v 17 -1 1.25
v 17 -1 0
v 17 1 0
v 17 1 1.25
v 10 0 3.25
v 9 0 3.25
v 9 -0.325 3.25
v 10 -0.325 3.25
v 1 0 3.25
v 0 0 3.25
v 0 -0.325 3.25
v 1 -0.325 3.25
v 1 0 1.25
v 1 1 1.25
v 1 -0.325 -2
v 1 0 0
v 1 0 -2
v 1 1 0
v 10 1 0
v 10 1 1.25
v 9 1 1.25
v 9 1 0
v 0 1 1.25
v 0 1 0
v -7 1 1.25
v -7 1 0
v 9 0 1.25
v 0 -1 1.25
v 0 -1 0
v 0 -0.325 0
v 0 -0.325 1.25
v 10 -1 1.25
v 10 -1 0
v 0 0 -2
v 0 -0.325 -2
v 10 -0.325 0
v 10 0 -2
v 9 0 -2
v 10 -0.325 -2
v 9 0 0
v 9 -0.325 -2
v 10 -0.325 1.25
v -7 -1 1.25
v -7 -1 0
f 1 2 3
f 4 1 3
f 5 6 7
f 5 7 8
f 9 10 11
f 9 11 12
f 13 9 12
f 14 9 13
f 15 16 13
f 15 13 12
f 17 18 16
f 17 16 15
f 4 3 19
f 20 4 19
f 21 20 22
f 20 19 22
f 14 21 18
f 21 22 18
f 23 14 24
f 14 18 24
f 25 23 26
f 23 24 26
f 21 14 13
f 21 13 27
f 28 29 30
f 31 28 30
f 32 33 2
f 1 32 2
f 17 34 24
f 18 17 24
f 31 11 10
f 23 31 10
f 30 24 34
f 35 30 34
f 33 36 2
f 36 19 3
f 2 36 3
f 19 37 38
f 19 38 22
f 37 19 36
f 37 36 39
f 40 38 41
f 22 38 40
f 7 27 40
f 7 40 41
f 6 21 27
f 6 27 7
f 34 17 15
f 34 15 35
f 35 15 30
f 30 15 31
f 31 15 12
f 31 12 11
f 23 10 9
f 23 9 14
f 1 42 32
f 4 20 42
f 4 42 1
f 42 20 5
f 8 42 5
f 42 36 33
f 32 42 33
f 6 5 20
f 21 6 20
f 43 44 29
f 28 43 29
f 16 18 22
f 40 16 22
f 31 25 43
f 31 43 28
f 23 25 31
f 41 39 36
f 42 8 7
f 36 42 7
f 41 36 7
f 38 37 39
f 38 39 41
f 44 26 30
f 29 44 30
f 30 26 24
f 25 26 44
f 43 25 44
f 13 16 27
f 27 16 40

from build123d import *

# Parameters (mm, degrees)
BOSS_EXTRUDE1_DEPTH = 1.25
SKETCH2_W           = 1
SKETCH2_H           = 0.325
BOSS_EXTRUDE2_DEPTH = 2
SKETCH3_W           = 1
SKETCH3_H           = 0.325
BOSS_EXTRUDE3_DEPTH = 2
BOSS_EXTRUDE7_DEPTH = 1
BOSS_EXTRUDE8_DEPTH = 1


with BuildPart() as part:
    # Sketch1 → Boss-Extrude1 (new body)
    with BuildSketch(Plane.XY):
        Polygon((1, 0), (9, 0), (9, -0.325), (10, -0.325), (10, -1), (17, -1), (17, 1), (10, 1), (0, 1), (-7, 1), (-7, -1), (0, -1), (0, -0.325), (1, -0.325), align=None)
    extrude(amount=BOSS_EXTRUDE1_DEPTH)

    # Sketch2 → Boss-Extrude2 (add)
    with BuildSketch(Plane.XY.offset(1.25)):
        with Locations((0.5, -0.1625)):
            Rectangle(SKETCH2_W, SKETCH2_H)
        with Locations((9.5, -0.1625)):
            Rectangle(SKETCH2_W, SKETCH2_H)
    extrude(amount=BOSS_EXTRUDE2_DEPTH)

    # Sketch3 → Boss-Extrude3 (add)
    with BuildSketch(Plane(origin=(0, 0, 0), x_dir=(-1, 0, 0), z_dir=(0, 0, -1))):
        with Locations((-9.5, -0.1625)):
            Rectangle(SKETCH3_W, SKETCH3_H)
        with Locations((-0.5, -0.1625)):
            Rectangle(SKETCH3_W, SKETCH3_H)
    extrude(amount=BOSS_EXTRUDE3_DEPTH)

    # Sketch7 → Boss-Extrude7 (add)
    with BuildSketch(Plane(origin=(10, 0, 0), x_dir=(0, 0, -1), z_dir=(1, 0, 0))):
        Polygon((-3.25, 0), (-1.25, 1), (-1.25, 0), (-1.25, -0.325), (-3.25, -0.325), align=None)
        Polygon((2, 0), (0, 1), (0, 0), align=None)
    extrude(amount=-BOSS_EXTRUDE7_DEPTH)

    # Sketch8 → Boss-Extrude8 (add)
    with BuildSketch(Plane.ZY):
        Polygon((-2, 0), (0, 1), (0, 0), align=None)
        Polygon((1.25, 1), (1.25, 0), (3.25, 0), align=None)
    extrude(amount=-BOSS_EXTRUDE8_DEPTH)


solid = part.part
